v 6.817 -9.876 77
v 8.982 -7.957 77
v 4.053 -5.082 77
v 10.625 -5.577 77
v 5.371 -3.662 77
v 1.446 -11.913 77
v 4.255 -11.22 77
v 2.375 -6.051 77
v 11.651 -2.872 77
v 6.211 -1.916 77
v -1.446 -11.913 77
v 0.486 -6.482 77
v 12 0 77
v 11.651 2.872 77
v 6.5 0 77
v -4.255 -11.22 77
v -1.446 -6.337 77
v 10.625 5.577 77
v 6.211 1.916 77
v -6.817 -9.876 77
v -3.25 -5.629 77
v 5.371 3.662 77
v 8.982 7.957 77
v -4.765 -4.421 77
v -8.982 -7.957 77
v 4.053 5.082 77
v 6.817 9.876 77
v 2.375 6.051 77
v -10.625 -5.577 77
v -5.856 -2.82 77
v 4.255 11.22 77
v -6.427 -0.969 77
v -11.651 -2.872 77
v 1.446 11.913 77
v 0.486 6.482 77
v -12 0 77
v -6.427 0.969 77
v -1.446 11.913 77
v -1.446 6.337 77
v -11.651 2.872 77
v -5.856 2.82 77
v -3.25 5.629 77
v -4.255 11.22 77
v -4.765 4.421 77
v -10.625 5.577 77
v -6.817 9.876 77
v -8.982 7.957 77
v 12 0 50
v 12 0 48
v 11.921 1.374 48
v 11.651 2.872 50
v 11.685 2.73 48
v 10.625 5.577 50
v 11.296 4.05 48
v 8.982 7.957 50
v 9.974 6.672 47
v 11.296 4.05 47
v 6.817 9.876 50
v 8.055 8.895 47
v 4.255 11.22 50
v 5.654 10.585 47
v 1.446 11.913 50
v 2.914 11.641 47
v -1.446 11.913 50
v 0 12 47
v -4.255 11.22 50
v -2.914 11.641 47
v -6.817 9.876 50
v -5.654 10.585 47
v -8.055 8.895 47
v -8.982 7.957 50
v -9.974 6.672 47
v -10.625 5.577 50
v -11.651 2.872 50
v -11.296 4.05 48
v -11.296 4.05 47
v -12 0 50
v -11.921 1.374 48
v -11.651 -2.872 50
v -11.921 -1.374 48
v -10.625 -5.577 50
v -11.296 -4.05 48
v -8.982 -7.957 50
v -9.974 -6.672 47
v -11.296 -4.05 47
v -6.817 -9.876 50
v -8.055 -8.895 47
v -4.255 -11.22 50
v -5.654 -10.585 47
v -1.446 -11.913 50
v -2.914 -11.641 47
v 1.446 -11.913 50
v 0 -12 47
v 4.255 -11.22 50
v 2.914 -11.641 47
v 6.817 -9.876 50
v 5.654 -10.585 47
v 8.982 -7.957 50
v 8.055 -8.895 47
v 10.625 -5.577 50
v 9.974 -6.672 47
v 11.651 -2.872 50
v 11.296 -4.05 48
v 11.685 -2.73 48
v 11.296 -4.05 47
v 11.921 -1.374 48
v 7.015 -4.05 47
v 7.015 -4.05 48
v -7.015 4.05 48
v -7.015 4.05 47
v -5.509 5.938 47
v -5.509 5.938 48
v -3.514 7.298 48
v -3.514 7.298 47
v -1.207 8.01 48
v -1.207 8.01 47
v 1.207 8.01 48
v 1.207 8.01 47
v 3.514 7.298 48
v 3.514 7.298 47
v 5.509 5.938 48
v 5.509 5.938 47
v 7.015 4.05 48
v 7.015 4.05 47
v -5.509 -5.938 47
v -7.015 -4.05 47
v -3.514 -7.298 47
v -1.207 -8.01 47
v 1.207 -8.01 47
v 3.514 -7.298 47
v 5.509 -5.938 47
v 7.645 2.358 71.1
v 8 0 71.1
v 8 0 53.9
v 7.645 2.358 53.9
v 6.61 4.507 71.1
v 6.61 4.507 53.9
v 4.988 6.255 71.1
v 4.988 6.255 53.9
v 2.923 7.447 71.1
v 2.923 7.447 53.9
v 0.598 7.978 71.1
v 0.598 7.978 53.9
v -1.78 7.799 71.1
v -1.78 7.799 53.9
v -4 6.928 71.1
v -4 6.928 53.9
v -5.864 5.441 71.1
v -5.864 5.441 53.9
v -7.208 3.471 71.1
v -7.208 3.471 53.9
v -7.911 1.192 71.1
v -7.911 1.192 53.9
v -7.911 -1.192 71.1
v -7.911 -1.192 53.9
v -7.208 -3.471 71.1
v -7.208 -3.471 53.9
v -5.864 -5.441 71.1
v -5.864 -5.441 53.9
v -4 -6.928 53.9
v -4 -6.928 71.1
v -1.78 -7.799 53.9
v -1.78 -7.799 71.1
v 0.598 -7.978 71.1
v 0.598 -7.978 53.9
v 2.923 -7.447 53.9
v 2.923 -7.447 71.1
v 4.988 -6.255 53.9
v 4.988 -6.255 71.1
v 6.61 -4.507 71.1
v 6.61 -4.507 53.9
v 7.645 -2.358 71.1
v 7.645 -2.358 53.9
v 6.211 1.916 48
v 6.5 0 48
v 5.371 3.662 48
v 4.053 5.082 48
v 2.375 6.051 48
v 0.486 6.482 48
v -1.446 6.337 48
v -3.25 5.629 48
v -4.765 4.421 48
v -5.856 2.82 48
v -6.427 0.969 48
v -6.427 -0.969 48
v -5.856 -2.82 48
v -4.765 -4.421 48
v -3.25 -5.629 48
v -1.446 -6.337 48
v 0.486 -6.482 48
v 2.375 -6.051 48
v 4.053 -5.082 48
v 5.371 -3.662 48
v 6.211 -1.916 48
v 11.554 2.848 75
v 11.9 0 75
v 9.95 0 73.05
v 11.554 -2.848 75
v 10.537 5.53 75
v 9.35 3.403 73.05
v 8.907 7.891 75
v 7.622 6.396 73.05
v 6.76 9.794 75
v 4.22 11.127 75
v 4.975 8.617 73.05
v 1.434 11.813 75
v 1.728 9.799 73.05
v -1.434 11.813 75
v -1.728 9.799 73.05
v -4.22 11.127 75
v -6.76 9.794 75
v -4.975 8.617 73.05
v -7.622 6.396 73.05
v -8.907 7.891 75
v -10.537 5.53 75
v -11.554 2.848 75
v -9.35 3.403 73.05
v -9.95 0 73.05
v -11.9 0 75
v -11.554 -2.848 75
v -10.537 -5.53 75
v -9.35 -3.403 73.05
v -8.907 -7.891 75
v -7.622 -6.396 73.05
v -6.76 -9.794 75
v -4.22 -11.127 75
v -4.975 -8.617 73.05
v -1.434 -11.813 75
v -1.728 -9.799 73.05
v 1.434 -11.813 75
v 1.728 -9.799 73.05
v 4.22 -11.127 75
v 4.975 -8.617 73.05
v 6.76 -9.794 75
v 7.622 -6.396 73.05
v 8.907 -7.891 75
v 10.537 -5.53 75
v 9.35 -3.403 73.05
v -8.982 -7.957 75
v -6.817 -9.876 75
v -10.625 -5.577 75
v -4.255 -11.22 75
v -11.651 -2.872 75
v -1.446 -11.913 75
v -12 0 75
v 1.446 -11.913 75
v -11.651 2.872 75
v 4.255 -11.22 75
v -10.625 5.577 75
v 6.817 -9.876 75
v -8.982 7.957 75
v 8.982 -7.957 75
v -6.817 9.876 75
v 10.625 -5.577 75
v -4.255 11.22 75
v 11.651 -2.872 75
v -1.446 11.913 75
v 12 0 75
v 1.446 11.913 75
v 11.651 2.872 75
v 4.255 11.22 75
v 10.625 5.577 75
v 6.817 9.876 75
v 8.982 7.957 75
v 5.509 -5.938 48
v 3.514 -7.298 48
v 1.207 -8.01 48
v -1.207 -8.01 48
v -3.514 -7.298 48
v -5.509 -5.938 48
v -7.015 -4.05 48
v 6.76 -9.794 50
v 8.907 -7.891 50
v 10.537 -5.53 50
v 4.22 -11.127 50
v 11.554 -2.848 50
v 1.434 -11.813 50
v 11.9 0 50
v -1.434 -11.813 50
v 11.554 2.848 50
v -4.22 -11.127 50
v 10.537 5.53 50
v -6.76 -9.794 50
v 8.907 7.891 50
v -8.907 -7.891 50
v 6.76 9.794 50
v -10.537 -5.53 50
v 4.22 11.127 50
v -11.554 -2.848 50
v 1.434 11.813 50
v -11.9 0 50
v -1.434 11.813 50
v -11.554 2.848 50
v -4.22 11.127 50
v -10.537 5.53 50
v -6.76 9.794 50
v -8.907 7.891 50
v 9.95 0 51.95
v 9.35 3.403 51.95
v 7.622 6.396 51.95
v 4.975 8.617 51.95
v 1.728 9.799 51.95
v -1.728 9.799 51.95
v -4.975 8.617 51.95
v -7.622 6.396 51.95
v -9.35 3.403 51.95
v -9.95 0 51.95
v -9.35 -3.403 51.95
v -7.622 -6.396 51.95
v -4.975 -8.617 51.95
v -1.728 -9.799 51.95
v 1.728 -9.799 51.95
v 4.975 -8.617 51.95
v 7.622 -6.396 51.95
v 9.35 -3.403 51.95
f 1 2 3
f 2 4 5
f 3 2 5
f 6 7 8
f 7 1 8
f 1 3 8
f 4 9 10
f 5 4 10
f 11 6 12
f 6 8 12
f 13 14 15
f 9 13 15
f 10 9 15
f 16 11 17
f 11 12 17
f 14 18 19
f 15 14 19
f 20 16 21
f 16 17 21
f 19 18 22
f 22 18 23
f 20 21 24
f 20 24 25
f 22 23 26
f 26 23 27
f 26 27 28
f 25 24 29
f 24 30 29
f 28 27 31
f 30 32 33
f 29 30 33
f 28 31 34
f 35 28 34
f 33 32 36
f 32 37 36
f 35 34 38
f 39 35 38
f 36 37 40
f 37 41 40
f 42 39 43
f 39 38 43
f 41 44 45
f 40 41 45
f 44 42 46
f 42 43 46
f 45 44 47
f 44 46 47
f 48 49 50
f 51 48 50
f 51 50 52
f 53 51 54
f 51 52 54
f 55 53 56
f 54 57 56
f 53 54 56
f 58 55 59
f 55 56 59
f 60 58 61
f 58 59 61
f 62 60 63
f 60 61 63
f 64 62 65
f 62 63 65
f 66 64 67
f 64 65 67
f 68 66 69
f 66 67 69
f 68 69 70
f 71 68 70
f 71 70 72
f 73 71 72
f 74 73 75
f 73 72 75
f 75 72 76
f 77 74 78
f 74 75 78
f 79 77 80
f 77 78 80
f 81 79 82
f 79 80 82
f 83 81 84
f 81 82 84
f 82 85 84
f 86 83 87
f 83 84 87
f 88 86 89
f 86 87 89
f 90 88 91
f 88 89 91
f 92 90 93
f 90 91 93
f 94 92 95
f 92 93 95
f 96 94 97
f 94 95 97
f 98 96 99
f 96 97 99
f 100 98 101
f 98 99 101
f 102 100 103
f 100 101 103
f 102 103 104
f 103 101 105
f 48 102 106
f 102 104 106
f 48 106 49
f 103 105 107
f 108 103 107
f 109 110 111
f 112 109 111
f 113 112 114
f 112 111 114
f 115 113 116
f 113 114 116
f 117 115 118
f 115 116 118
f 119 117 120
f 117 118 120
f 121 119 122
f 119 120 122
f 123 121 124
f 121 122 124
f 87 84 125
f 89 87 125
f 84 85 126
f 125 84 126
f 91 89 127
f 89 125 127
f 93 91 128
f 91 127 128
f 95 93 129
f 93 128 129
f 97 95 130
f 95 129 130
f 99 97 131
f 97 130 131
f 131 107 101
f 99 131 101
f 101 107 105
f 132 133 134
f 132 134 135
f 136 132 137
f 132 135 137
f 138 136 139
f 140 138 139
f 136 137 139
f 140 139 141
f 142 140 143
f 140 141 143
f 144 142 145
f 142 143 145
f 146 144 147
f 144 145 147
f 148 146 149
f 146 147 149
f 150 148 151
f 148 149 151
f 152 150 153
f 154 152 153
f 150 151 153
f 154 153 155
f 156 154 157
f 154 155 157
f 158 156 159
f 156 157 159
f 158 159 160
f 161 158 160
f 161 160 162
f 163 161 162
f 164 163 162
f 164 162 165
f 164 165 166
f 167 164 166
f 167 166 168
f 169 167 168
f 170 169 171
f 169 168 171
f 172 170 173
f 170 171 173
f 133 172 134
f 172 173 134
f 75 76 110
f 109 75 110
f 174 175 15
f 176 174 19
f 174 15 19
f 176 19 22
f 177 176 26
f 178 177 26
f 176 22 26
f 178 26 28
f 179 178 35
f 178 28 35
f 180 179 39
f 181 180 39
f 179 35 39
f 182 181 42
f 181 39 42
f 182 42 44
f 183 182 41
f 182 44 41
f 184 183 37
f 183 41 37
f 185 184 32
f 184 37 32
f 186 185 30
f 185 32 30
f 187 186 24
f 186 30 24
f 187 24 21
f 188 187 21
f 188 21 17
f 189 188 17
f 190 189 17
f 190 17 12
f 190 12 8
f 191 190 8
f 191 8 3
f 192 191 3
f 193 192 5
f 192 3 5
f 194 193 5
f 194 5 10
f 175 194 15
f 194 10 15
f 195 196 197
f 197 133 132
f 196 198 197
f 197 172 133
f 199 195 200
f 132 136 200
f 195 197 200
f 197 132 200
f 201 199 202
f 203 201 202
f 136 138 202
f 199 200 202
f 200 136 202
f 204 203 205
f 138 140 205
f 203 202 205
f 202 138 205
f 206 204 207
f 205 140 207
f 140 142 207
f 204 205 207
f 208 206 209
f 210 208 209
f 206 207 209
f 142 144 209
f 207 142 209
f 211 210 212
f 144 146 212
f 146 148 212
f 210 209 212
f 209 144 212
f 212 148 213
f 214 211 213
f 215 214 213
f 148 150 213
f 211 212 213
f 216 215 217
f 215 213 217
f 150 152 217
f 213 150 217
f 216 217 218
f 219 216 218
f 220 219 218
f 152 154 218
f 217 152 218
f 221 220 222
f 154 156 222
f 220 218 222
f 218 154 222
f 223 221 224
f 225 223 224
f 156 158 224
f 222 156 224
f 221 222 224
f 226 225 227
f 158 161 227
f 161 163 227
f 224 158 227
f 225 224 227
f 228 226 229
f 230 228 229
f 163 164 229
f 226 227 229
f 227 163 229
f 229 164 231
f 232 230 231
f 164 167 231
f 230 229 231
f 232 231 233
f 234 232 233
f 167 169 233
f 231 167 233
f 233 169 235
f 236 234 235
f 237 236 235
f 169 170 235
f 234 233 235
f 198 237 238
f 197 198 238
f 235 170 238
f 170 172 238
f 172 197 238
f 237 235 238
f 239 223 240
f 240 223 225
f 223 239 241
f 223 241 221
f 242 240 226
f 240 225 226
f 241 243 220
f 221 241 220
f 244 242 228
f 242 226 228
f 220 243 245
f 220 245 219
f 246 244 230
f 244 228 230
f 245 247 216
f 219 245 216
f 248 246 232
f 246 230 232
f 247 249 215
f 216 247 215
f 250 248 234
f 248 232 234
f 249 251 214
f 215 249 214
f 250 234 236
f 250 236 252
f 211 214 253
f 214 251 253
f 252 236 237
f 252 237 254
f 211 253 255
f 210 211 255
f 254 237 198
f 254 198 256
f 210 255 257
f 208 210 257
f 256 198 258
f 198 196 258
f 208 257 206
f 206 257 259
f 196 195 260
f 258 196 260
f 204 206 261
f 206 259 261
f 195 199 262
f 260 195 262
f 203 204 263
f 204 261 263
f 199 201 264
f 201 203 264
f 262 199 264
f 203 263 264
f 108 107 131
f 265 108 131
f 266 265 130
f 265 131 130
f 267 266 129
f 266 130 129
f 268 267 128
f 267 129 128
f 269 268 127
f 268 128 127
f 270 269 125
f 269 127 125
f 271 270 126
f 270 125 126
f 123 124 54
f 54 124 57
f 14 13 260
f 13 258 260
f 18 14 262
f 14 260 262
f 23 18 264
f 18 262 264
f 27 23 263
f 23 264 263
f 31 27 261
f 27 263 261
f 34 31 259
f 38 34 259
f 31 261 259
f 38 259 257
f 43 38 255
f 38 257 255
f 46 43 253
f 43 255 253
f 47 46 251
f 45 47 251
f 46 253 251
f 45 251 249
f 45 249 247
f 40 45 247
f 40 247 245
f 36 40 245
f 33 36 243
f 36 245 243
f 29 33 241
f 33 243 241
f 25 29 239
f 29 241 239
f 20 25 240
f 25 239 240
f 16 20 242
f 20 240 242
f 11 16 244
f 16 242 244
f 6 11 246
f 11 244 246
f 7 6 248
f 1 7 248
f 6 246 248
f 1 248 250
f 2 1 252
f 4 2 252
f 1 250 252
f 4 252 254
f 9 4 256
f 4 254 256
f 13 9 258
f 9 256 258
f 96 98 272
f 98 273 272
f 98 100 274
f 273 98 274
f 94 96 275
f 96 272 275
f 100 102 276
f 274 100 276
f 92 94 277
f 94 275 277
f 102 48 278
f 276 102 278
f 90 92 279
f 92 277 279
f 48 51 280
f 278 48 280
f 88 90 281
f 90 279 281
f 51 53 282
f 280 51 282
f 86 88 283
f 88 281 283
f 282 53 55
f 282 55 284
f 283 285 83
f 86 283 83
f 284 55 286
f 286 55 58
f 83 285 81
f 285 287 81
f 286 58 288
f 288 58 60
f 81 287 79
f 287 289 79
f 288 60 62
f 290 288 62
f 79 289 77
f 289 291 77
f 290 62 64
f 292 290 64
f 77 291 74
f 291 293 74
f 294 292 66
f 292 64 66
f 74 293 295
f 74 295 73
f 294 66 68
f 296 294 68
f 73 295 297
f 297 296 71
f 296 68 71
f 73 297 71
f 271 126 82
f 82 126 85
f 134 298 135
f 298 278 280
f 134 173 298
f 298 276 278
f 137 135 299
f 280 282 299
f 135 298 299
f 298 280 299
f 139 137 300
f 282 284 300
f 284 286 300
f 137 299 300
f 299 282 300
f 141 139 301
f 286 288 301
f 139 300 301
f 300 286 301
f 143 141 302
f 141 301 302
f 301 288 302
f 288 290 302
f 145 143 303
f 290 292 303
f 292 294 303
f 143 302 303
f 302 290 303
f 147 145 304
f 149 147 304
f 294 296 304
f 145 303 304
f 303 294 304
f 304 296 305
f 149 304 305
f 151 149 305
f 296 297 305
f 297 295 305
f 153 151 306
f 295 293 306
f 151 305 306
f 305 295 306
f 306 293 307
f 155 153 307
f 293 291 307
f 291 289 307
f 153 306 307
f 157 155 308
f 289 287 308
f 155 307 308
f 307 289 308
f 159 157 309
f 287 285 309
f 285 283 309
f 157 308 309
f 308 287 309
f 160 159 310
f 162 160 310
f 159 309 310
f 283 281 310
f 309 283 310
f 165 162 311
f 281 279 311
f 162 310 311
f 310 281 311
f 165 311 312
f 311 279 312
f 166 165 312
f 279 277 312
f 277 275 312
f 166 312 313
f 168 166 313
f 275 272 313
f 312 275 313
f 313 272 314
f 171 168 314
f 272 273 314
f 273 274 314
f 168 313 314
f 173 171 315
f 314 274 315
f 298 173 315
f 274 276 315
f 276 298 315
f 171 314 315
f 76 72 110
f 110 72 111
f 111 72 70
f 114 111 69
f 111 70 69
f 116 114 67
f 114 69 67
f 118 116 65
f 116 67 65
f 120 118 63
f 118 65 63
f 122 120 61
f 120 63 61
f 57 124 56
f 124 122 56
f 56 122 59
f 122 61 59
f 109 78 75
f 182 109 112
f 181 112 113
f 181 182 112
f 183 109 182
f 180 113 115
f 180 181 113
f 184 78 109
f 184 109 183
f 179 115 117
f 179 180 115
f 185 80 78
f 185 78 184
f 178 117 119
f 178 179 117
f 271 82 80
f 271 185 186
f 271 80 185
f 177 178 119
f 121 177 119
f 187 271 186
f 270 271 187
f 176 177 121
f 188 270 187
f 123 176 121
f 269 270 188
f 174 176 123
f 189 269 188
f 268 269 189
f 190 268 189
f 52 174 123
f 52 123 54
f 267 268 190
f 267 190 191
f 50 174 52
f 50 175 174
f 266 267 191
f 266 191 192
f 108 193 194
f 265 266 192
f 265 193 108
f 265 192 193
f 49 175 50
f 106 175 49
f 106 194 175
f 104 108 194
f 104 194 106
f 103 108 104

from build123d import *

# Parameters (mm, degrees)
POCKET_DEPTH = 1
CHAMFER_SIZE = 3.9


with BuildPart() as part:
    # Sketch004 (on XZ_Plane001 of Origin002) → Revolution001 (revolve)
    with BuildSketch(Plane.XZ):
        Polygon((6.5, 77), (12, 77), (12, 75), (8, 75), (8, 50), (12, 50), (12, 47), (6.5, 47), align=None)
    revolve(axis=Axis((0, 0, 0), (0, 0, 1)))

    # Sketch005 (on Face7 of Revolution001) → Pocket (cut)
    with BuildSketch(Plane(origin=(0, 0, 47), x_dir=(1, 0, 0), z_dir=(0, 0, -1))):
        with BuildLine():
            ThreePointArc((7.014806, 4.05), (0, 8.1), (-7.014806, 4.05))
            Line((-7.014806, 4.05), (-12, 4.05))
            Line((-12, 4.05), (-12, -4.05))
            Line((-12, -4.05), (-7.014806, -4.05))
            ThreePointArc((-7.014806, -4.05), (0, -8.1), (7.014806, -4.05))
            Line((7.014806, -4.05), (12, -4.05))
            Line((12, -4.05), (12, 4.05))
            Line((12, 4.05), (7.014806, 4.05))
        make_face()
    extrude(amount=-POCKET_DEPTH, mode=Mode.SUBTRACT)

    # Chamfer
    chamfer_edges = [part.edges().sort_by_distance(p)[0] for p in [
        (-8, 0, 75),
        (-8, 0, 50),
    ]]
    chamfer(chamfer_edges, length=CHAMFER_SIZE)


solid = part.part
